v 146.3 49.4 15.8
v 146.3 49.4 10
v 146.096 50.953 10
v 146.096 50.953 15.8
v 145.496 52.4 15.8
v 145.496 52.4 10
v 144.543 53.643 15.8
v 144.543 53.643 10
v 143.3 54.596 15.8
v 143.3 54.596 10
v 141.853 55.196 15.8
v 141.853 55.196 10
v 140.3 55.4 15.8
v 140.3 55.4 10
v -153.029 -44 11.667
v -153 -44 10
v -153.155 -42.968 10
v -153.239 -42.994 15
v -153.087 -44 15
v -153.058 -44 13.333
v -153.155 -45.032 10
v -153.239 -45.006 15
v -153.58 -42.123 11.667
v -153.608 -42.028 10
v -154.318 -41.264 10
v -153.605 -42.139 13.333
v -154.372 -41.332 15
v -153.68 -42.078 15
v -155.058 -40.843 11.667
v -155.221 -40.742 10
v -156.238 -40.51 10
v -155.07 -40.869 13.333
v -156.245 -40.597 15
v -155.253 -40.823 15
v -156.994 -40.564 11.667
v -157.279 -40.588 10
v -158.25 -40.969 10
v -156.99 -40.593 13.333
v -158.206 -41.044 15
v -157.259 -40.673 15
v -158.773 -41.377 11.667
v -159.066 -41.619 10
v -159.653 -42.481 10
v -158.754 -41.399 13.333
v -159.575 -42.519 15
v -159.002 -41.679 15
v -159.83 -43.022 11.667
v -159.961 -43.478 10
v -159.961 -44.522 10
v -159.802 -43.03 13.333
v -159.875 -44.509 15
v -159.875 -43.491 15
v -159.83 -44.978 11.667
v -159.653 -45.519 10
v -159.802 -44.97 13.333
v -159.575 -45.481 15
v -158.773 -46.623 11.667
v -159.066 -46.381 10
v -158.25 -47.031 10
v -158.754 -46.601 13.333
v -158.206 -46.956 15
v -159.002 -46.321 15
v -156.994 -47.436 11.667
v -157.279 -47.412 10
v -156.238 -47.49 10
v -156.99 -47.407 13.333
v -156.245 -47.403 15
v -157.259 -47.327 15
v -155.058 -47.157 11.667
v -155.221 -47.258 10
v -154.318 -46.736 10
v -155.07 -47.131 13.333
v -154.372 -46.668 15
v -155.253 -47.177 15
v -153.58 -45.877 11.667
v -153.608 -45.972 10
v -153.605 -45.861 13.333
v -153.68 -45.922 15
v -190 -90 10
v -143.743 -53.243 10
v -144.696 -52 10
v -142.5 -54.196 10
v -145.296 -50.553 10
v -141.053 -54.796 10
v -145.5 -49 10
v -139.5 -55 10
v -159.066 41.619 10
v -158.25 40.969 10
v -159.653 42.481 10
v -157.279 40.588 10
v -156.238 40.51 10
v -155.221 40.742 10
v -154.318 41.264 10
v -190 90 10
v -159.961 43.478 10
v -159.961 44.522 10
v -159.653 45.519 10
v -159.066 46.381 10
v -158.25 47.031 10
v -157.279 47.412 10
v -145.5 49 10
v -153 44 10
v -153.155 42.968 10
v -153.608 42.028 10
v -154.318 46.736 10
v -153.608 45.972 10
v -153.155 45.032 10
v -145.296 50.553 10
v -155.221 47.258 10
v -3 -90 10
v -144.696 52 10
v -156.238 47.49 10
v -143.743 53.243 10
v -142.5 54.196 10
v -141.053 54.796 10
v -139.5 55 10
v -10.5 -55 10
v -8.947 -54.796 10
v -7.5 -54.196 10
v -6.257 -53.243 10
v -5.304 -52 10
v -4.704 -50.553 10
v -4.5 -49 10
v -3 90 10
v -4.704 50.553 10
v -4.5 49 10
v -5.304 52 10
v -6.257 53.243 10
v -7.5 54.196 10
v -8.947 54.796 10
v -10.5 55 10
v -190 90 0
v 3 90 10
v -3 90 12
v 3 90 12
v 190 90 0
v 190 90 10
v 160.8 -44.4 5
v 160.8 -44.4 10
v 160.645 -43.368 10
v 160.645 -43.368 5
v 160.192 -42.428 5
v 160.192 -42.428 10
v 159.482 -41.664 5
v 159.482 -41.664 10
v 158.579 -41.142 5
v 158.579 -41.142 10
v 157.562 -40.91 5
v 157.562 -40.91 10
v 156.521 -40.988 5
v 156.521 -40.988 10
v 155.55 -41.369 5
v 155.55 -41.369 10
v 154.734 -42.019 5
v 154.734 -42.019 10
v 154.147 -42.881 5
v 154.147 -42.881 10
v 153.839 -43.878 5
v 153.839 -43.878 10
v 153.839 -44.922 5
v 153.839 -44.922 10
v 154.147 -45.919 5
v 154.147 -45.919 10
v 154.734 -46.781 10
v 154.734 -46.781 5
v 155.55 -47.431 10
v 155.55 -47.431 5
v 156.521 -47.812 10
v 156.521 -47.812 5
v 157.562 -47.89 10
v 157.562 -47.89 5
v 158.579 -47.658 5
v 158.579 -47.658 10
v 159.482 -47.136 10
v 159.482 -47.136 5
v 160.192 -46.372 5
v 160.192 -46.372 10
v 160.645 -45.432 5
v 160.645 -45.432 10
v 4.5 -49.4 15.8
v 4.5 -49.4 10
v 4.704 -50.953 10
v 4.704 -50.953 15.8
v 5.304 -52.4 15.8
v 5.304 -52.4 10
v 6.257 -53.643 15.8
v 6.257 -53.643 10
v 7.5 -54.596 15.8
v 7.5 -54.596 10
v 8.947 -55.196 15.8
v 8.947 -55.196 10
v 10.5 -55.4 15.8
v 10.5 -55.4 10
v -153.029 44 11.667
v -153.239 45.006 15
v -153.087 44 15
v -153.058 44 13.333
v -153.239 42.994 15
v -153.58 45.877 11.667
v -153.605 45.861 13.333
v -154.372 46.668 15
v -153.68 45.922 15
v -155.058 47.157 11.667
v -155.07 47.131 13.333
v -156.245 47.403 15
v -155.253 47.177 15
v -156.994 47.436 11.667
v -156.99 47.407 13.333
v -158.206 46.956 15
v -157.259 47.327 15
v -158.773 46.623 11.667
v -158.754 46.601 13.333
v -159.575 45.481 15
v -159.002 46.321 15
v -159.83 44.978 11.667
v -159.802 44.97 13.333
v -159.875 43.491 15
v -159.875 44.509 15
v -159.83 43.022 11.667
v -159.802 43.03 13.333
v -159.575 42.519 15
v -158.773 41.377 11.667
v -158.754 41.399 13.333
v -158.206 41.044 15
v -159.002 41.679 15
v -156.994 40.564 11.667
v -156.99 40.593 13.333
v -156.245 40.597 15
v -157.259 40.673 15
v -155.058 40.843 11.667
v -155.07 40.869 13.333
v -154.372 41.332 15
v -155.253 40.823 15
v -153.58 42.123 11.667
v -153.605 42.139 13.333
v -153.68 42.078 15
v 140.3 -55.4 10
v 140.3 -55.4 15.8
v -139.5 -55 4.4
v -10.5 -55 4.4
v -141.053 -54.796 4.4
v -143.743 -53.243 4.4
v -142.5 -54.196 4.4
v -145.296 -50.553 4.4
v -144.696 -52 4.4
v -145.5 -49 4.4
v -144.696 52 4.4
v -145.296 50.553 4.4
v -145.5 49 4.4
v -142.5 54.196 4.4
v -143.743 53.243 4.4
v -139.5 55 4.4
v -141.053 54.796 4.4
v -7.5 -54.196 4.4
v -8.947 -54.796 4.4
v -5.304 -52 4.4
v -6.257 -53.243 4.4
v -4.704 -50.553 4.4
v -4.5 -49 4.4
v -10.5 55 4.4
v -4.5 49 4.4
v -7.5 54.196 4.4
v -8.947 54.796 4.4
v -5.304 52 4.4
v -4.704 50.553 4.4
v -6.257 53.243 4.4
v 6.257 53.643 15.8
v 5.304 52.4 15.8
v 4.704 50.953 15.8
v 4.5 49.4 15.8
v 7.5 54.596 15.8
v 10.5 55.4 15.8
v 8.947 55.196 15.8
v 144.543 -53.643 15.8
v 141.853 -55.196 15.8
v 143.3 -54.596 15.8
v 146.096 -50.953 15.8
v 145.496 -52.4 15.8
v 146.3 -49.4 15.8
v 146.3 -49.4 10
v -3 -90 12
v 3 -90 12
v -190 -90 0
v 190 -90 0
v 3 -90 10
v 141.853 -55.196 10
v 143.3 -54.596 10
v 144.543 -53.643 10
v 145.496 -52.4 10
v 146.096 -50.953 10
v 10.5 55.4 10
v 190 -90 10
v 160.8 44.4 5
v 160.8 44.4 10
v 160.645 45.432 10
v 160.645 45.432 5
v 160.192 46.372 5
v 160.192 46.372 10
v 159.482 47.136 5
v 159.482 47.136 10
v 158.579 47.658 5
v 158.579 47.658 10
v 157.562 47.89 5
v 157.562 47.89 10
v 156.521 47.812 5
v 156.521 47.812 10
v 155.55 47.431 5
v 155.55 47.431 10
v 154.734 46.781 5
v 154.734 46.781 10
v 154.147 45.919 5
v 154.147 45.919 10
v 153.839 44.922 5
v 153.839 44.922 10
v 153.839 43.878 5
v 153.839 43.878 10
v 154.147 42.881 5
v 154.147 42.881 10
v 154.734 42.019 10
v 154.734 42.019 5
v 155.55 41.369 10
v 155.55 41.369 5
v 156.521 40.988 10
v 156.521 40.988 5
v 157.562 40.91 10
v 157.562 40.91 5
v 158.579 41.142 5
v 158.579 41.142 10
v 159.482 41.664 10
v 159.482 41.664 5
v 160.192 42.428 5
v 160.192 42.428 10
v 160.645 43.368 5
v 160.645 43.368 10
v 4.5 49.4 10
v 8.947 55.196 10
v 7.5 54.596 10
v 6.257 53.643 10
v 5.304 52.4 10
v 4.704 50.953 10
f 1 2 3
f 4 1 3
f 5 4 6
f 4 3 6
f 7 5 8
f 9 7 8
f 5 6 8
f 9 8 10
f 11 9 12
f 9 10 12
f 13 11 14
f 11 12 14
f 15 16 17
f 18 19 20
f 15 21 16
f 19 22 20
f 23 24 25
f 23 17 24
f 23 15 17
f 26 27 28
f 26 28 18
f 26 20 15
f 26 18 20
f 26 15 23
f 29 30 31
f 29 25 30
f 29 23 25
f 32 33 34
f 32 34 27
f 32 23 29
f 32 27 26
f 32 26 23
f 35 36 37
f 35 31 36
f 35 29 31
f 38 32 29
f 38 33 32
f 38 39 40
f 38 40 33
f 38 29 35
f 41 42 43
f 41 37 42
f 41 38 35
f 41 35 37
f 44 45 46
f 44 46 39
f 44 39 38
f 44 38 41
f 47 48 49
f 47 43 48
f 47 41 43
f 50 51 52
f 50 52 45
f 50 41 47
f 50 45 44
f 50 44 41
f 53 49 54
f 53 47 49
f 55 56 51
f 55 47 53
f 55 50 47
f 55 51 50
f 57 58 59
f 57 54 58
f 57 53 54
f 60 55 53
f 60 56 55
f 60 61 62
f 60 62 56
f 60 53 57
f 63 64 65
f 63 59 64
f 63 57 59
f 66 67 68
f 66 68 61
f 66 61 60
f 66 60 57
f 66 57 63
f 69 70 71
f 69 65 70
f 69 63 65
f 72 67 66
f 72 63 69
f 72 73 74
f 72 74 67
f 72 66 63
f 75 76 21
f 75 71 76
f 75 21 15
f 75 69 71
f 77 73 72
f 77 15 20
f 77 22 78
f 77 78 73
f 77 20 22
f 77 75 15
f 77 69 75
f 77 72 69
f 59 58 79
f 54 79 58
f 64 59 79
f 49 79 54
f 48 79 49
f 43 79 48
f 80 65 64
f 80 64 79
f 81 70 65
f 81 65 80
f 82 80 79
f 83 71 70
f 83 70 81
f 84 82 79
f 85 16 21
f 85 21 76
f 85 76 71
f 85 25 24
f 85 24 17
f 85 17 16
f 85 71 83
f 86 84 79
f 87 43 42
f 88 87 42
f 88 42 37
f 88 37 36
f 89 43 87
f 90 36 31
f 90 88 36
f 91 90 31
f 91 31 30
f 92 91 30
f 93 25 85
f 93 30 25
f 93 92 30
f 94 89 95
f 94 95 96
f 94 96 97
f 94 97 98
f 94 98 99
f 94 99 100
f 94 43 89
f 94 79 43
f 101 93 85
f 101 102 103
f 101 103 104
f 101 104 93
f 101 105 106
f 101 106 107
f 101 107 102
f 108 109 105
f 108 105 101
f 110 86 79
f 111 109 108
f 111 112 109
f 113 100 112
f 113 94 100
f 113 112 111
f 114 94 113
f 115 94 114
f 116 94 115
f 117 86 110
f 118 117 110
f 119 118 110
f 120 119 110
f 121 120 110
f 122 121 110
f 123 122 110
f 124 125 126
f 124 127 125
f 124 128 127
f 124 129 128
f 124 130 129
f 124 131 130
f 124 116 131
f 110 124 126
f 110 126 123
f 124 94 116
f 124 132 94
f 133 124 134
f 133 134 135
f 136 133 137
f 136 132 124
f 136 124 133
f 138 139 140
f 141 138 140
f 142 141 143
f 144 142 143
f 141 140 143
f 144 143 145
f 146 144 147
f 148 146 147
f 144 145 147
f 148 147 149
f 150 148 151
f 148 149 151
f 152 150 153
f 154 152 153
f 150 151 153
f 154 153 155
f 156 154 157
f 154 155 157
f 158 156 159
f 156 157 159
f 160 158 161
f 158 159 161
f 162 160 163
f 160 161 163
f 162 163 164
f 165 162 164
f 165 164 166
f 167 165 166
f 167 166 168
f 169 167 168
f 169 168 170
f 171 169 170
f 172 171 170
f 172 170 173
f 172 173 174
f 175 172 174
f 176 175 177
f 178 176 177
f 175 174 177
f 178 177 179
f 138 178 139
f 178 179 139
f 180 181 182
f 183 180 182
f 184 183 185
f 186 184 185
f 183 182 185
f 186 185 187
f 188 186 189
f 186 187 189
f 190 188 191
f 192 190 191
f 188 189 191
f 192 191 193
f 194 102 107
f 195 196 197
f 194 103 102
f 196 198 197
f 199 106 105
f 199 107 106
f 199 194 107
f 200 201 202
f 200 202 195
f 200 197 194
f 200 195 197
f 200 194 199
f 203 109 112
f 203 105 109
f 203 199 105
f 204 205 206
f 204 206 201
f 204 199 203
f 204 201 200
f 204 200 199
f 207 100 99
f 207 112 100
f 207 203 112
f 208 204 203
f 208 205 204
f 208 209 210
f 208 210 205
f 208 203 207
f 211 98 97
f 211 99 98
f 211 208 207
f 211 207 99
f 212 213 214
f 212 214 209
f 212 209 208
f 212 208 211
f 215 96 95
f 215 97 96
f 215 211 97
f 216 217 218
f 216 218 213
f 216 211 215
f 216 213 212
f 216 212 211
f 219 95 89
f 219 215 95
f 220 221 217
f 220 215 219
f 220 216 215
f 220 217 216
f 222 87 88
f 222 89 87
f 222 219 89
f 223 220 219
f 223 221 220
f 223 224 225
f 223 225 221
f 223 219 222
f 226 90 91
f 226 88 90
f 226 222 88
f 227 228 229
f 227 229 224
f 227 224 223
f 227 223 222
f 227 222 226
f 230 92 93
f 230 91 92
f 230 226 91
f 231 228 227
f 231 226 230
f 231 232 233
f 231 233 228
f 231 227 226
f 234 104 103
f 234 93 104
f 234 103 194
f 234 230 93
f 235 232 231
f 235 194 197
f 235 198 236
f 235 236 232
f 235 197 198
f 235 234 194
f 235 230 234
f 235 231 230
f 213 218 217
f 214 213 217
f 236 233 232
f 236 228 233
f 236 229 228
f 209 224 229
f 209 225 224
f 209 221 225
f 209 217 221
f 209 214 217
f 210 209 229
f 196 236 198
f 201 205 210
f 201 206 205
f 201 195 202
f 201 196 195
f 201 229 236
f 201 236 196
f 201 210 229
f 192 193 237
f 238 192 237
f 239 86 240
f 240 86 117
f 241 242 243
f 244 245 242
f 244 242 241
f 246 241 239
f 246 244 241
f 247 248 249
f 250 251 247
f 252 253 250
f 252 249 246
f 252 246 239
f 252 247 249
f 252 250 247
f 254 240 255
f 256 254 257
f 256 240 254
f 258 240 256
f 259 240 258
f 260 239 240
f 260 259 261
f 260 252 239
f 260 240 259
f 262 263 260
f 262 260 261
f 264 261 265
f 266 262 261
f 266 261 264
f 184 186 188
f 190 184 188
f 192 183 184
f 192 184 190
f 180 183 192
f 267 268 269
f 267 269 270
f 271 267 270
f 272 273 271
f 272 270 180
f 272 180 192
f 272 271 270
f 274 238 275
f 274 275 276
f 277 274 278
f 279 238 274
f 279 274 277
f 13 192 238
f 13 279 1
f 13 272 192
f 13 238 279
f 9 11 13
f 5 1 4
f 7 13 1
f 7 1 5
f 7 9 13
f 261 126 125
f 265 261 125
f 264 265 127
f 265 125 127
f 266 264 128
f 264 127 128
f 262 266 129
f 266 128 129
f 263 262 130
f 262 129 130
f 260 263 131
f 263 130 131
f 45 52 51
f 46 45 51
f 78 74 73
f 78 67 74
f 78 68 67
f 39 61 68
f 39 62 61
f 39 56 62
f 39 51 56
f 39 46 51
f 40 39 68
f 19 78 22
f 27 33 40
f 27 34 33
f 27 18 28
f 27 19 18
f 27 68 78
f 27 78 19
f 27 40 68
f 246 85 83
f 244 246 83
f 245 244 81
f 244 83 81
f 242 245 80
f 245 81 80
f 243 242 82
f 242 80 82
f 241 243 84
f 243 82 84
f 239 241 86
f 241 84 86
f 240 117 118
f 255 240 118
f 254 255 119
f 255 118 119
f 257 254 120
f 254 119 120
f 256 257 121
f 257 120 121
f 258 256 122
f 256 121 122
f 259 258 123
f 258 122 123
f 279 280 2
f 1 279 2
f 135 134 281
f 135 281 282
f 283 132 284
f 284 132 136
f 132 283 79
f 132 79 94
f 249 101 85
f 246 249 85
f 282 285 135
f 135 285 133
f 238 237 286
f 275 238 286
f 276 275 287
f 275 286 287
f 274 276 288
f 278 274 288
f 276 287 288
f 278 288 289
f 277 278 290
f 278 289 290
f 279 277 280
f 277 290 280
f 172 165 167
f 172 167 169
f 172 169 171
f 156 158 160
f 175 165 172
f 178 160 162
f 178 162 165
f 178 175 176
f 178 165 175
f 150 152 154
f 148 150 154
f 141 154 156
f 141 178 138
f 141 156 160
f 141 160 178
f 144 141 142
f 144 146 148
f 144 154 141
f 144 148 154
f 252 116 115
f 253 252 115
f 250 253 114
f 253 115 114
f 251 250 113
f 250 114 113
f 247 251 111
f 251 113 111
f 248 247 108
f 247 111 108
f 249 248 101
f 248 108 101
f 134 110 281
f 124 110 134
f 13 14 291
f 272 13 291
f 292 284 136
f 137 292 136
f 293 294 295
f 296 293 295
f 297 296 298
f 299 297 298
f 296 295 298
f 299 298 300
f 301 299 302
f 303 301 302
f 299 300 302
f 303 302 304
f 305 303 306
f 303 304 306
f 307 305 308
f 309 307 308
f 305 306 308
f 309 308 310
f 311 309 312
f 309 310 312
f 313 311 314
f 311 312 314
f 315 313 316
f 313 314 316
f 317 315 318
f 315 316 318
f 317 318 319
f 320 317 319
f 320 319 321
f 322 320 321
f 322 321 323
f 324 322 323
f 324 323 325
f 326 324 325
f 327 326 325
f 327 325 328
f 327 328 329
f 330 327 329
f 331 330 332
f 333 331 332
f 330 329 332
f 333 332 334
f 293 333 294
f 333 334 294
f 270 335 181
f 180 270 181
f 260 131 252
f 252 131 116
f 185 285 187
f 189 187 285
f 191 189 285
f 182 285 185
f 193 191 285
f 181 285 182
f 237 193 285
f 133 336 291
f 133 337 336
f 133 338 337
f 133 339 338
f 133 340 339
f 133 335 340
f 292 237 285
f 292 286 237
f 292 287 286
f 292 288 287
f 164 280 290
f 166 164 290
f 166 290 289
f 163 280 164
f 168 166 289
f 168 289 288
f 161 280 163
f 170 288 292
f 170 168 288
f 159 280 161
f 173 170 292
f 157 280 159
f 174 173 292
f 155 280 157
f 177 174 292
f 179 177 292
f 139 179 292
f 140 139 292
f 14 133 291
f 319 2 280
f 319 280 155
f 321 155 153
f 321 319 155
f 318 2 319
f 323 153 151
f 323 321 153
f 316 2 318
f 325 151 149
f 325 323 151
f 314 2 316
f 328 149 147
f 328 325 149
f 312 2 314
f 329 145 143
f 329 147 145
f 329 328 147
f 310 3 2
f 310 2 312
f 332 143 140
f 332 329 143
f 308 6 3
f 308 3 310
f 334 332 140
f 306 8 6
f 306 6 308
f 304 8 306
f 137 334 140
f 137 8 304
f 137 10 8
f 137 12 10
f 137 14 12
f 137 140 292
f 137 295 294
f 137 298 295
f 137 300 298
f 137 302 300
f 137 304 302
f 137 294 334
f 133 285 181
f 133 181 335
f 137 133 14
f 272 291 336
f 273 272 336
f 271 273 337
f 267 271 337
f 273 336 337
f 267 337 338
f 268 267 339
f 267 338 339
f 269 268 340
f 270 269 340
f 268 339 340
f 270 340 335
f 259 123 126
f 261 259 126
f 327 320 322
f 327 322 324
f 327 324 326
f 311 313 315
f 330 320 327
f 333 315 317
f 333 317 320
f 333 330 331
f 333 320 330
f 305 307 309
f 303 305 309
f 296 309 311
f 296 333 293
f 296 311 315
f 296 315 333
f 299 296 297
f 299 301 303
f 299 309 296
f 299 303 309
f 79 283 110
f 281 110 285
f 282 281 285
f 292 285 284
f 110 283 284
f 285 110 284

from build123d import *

# Parameters (mm, degrees)
F0_W      = 380
F0_H      = 180
F1_DEPTH  = 10
F2_W      = 6
F2_H      = 180
F3_DEPTH  = 2
F5_DEPTH  = 5.6
F7_DEPTH  = 5.8
F8_R      = 3.5
F9_DEPTH  = 5
F9_TAPER  = 1
F10_R     = 3.5
F11_DEPTH = 5


with BuildPart() as f1:
    # F0 (on Top) → F1 (new body)
    with BuildSketch(Plane.XY):
        Rectangle(F0_W, F0_H)
    extrude(amount=F1_DEPTH)

    # F2 (on face) → F3 (join)
    with BuildSketch(Plane.XY.offset(10)):
        Rectangle(F2_W, F2_H)
    extrude(amount=F3_DEPTH)

    # F4 (on face) → F5 (cut)
    with BuildSketch(Plane.XY.offset(10)):
        with BuildLine():
            ThreePointArc((-4.5, 49), (-6.2573593129, 53.2426406871), (-10.5, 55))
            Line((-10.5, 55), (-139.5, 55))
            ThreePointArc((-139.5, 55), (-143.7426406871, 53.2426406871), (-145.5, 49))
            Line((-145.5, 49), (-145.5, -49))
            ThreePointArc((-145.5, -49), (-143.7426406871, -53.2426406871), (-139.5, -55))
            Line((-139.5, -55), (-10.5, -55))
            ThreePointArc((-10.5, -55), (-6.2573593129, -53.2426406871), (-4.5, -49))
            Line((-4.5, -49), (-4.5, 49))
        make_face()
    extrude(amount=-F5_DEPTH, mode=Mode.SUBTRACT)

    # F6 (on face) → F7 (join)
    with BuildSketch(Plane.XY.offset(10)):
        with BuildLine():
            Line((140.3, 55.4), (10.5, 55.4))
            ThreePointArc((10.5, 55.4), (6.2573593129, 53.6426406871), (4.5, 49.4))
            Line((4.5, 49.4), (4.5, -49.4))
            ThreePointArc((4.5, -49.4), (6.2573593129, -53.6426406871), (10.5, -55.4))
            Line((10.5, -55.4), (140.3, -55.4))
            ThreePointArc((140.3, -55.4), (144.5426406871, -53.6426406871), (146.3, -49.4))
            Line((146.3, -49.4), (146.3, 49.4))
            ThreePointArc((146.3, 49.4), (144.5426406871, 53.6426406871), (140.3, 55.4))
        make_face()
    extrude(amount=F7_DEPTH)

    # F8 (on face) → F9 (join)
    with BuildSketch(Plane.XY.offset(10)):
        with Locations((-156.5, 44)):
            Circle(F8_R)
        with Locations((-156.5, -44)):
            Circle(F8_R)
    extrude(amount=F9_DEPTH, taper=F9_TAPER)

    # F10 (on face) → F11 (cut)
    with BuildSketch(Plane.XY.offset(10)):
        with Locations((157.3, 44.4)):
            Circle(F10_R)
        with Locations((157.3, -44.4)):
            Circle(F10_R)
    extrude(amount=-F11_DEPTH, mode=Mode.SUBTRACT)


solid = f1.part
